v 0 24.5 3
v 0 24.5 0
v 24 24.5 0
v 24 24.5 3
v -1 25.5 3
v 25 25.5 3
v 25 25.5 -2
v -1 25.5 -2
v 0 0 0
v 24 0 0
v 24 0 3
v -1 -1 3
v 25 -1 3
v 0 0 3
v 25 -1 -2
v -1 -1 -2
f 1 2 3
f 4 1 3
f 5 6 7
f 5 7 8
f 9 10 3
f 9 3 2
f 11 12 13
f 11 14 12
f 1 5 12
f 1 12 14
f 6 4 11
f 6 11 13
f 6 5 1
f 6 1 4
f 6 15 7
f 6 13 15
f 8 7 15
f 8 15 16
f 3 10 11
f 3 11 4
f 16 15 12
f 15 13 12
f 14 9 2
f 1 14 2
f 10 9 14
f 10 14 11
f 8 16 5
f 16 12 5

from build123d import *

# Parameters (mm, degrees)
SKETCH_1_W      = 26
SKETCH_1_H      = 26.5
SKETCH_1_W_2    = 24
SKETCH_1_H_2    = 24.5
EXTRUDE_1_DEPTH = 3
SKETCH_2_W      = 26
SKETCH_2_H      = 26.5
EXTRUDE_2_DEPTH = 2


with BuildPart() as part:
    # 草图1 → 凸台-拉伸1 (new body)
    with BuildSketch(Plane.XY):
        with Locations((12, 12.25)):
            Rectangle(SKETCH_1_W, SKETCH_1_H)
        with Locations((12, 12.25)):
            Rectangle(SKETCH_1_W_2, SKETCH_1_H_2, mode=Mode.SUBTRACT)
    extrude(amount=EXTRUDE_1_DEPTH)

    # 草图2 → 凸台-拉伸2 (add)
    with BuildSketch(Plane(origin=(0, 0, 0), x_dir=(-1, 0, 0), z_dir=(0, 0, -1))):
        with Locations((-12, 12.25)):
            Rectangle(SKETCH_2_W, SKETCH_2_H)
    extrude(amount=EXTRUDE_2_DEPTH)


solid = part.part
